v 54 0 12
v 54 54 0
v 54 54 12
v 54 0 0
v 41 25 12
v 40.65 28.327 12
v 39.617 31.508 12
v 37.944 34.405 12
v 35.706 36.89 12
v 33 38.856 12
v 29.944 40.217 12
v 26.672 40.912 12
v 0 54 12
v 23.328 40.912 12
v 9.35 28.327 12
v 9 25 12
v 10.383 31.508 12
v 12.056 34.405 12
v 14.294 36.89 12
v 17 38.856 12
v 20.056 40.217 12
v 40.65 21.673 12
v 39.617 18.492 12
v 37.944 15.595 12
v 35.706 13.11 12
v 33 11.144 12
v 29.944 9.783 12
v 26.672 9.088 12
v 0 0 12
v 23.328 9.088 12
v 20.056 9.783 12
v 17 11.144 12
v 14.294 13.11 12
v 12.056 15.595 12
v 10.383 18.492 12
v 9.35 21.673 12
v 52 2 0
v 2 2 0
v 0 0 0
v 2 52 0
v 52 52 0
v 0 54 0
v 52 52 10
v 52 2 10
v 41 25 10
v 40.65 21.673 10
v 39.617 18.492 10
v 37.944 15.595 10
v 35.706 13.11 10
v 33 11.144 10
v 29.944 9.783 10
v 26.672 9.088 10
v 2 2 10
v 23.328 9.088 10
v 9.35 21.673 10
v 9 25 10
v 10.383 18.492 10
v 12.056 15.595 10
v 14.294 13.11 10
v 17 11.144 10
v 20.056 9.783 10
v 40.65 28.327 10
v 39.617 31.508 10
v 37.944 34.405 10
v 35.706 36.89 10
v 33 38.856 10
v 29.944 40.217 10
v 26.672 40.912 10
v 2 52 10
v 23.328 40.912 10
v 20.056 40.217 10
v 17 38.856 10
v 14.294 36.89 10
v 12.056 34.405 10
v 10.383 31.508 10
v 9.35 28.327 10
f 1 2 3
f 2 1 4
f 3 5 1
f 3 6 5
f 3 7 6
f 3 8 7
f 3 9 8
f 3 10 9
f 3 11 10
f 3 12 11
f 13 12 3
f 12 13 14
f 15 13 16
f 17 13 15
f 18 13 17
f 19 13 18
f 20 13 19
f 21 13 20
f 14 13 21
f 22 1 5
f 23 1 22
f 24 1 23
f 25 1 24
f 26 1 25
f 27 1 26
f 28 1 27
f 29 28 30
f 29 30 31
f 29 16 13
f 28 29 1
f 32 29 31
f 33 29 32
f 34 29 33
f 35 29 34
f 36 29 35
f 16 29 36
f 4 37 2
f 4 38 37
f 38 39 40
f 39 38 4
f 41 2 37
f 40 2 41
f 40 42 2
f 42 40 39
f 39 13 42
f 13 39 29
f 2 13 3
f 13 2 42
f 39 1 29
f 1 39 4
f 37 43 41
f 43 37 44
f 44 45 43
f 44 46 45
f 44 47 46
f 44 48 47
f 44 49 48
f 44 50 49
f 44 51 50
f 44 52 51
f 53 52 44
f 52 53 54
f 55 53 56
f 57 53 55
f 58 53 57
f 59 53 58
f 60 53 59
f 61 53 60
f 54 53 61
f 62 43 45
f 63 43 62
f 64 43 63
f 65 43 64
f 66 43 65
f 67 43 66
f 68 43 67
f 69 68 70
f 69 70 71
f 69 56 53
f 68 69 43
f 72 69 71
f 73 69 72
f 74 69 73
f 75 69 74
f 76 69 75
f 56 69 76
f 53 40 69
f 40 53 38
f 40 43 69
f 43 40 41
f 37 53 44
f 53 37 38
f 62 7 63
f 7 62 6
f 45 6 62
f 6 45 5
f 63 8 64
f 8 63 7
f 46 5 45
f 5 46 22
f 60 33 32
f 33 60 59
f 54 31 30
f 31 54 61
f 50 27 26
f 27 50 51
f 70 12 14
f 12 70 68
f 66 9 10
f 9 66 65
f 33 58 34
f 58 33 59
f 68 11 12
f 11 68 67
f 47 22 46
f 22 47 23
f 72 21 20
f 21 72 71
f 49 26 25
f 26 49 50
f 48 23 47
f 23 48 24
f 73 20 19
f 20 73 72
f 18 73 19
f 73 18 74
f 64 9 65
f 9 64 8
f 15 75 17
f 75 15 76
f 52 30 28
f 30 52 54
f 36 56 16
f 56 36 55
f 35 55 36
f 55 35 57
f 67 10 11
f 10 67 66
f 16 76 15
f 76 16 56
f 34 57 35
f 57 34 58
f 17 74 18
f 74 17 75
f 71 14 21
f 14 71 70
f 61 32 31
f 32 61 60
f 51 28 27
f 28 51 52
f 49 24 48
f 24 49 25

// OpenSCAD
//Dimensiones de la tapa + porta polea
//Dimension del 
tubo=50;//dimensiones del caño
espesor_t=2;//espesor de la pared de la tapa
ancho_t=10;//ancho de la tapa
d_soplador=32;//diámetro del soplador
tapasoplador();
module tapasoplador(){
difference(){
cube(size=[tubo+2*espesor_t,tubo+2*espesor_t,ancho_t+espesor_t]);
    translate([espesor_t,espesor_t,0])
    cube(size=[tubo,tubo,ancho_t]);
    #translate([tubo/2,tubo/2,ancho_t/2]) cylinder(ancho_t*2,d_soplador/2,d_soplador/2,center=true);
    }}



//tapaypolea();
module tapaypolea(){
difference(){
cube(size=[tubo+2*espesor_t,tubo+2*espesor_t,ancho_t+espesor_t]);
    translate([espesor_t,espesor_t,0])
    cube(size=[tubo,tubo,ancho_t]);
    }

d_polea=30;
d_ruleman=3;
    translate([0,0,22])
    translate([30
    ,20,0])
    rotate([-90,-90,45])
difference(){
linear_extrude(height =ancho_t+2*espesor_t,  convexity = 10){
polygon([[-10,0],[-10,30],[10,35],[15,35],[15,30],[12.5,30]]);}
color("red")
translate([10,30,3])
cube(size=[5,5,8]);
translate([12.5,32.5,0])
cylinder(2*ancho_t,d_ruleman/2,$fn=50);
color("red")
translate([12.5,32.5,espesor_t+espesor_t/2])
cylinder(ancho_t-espesor_t,15+espesor_t,15+espesor_t,$fn=50);
}}
